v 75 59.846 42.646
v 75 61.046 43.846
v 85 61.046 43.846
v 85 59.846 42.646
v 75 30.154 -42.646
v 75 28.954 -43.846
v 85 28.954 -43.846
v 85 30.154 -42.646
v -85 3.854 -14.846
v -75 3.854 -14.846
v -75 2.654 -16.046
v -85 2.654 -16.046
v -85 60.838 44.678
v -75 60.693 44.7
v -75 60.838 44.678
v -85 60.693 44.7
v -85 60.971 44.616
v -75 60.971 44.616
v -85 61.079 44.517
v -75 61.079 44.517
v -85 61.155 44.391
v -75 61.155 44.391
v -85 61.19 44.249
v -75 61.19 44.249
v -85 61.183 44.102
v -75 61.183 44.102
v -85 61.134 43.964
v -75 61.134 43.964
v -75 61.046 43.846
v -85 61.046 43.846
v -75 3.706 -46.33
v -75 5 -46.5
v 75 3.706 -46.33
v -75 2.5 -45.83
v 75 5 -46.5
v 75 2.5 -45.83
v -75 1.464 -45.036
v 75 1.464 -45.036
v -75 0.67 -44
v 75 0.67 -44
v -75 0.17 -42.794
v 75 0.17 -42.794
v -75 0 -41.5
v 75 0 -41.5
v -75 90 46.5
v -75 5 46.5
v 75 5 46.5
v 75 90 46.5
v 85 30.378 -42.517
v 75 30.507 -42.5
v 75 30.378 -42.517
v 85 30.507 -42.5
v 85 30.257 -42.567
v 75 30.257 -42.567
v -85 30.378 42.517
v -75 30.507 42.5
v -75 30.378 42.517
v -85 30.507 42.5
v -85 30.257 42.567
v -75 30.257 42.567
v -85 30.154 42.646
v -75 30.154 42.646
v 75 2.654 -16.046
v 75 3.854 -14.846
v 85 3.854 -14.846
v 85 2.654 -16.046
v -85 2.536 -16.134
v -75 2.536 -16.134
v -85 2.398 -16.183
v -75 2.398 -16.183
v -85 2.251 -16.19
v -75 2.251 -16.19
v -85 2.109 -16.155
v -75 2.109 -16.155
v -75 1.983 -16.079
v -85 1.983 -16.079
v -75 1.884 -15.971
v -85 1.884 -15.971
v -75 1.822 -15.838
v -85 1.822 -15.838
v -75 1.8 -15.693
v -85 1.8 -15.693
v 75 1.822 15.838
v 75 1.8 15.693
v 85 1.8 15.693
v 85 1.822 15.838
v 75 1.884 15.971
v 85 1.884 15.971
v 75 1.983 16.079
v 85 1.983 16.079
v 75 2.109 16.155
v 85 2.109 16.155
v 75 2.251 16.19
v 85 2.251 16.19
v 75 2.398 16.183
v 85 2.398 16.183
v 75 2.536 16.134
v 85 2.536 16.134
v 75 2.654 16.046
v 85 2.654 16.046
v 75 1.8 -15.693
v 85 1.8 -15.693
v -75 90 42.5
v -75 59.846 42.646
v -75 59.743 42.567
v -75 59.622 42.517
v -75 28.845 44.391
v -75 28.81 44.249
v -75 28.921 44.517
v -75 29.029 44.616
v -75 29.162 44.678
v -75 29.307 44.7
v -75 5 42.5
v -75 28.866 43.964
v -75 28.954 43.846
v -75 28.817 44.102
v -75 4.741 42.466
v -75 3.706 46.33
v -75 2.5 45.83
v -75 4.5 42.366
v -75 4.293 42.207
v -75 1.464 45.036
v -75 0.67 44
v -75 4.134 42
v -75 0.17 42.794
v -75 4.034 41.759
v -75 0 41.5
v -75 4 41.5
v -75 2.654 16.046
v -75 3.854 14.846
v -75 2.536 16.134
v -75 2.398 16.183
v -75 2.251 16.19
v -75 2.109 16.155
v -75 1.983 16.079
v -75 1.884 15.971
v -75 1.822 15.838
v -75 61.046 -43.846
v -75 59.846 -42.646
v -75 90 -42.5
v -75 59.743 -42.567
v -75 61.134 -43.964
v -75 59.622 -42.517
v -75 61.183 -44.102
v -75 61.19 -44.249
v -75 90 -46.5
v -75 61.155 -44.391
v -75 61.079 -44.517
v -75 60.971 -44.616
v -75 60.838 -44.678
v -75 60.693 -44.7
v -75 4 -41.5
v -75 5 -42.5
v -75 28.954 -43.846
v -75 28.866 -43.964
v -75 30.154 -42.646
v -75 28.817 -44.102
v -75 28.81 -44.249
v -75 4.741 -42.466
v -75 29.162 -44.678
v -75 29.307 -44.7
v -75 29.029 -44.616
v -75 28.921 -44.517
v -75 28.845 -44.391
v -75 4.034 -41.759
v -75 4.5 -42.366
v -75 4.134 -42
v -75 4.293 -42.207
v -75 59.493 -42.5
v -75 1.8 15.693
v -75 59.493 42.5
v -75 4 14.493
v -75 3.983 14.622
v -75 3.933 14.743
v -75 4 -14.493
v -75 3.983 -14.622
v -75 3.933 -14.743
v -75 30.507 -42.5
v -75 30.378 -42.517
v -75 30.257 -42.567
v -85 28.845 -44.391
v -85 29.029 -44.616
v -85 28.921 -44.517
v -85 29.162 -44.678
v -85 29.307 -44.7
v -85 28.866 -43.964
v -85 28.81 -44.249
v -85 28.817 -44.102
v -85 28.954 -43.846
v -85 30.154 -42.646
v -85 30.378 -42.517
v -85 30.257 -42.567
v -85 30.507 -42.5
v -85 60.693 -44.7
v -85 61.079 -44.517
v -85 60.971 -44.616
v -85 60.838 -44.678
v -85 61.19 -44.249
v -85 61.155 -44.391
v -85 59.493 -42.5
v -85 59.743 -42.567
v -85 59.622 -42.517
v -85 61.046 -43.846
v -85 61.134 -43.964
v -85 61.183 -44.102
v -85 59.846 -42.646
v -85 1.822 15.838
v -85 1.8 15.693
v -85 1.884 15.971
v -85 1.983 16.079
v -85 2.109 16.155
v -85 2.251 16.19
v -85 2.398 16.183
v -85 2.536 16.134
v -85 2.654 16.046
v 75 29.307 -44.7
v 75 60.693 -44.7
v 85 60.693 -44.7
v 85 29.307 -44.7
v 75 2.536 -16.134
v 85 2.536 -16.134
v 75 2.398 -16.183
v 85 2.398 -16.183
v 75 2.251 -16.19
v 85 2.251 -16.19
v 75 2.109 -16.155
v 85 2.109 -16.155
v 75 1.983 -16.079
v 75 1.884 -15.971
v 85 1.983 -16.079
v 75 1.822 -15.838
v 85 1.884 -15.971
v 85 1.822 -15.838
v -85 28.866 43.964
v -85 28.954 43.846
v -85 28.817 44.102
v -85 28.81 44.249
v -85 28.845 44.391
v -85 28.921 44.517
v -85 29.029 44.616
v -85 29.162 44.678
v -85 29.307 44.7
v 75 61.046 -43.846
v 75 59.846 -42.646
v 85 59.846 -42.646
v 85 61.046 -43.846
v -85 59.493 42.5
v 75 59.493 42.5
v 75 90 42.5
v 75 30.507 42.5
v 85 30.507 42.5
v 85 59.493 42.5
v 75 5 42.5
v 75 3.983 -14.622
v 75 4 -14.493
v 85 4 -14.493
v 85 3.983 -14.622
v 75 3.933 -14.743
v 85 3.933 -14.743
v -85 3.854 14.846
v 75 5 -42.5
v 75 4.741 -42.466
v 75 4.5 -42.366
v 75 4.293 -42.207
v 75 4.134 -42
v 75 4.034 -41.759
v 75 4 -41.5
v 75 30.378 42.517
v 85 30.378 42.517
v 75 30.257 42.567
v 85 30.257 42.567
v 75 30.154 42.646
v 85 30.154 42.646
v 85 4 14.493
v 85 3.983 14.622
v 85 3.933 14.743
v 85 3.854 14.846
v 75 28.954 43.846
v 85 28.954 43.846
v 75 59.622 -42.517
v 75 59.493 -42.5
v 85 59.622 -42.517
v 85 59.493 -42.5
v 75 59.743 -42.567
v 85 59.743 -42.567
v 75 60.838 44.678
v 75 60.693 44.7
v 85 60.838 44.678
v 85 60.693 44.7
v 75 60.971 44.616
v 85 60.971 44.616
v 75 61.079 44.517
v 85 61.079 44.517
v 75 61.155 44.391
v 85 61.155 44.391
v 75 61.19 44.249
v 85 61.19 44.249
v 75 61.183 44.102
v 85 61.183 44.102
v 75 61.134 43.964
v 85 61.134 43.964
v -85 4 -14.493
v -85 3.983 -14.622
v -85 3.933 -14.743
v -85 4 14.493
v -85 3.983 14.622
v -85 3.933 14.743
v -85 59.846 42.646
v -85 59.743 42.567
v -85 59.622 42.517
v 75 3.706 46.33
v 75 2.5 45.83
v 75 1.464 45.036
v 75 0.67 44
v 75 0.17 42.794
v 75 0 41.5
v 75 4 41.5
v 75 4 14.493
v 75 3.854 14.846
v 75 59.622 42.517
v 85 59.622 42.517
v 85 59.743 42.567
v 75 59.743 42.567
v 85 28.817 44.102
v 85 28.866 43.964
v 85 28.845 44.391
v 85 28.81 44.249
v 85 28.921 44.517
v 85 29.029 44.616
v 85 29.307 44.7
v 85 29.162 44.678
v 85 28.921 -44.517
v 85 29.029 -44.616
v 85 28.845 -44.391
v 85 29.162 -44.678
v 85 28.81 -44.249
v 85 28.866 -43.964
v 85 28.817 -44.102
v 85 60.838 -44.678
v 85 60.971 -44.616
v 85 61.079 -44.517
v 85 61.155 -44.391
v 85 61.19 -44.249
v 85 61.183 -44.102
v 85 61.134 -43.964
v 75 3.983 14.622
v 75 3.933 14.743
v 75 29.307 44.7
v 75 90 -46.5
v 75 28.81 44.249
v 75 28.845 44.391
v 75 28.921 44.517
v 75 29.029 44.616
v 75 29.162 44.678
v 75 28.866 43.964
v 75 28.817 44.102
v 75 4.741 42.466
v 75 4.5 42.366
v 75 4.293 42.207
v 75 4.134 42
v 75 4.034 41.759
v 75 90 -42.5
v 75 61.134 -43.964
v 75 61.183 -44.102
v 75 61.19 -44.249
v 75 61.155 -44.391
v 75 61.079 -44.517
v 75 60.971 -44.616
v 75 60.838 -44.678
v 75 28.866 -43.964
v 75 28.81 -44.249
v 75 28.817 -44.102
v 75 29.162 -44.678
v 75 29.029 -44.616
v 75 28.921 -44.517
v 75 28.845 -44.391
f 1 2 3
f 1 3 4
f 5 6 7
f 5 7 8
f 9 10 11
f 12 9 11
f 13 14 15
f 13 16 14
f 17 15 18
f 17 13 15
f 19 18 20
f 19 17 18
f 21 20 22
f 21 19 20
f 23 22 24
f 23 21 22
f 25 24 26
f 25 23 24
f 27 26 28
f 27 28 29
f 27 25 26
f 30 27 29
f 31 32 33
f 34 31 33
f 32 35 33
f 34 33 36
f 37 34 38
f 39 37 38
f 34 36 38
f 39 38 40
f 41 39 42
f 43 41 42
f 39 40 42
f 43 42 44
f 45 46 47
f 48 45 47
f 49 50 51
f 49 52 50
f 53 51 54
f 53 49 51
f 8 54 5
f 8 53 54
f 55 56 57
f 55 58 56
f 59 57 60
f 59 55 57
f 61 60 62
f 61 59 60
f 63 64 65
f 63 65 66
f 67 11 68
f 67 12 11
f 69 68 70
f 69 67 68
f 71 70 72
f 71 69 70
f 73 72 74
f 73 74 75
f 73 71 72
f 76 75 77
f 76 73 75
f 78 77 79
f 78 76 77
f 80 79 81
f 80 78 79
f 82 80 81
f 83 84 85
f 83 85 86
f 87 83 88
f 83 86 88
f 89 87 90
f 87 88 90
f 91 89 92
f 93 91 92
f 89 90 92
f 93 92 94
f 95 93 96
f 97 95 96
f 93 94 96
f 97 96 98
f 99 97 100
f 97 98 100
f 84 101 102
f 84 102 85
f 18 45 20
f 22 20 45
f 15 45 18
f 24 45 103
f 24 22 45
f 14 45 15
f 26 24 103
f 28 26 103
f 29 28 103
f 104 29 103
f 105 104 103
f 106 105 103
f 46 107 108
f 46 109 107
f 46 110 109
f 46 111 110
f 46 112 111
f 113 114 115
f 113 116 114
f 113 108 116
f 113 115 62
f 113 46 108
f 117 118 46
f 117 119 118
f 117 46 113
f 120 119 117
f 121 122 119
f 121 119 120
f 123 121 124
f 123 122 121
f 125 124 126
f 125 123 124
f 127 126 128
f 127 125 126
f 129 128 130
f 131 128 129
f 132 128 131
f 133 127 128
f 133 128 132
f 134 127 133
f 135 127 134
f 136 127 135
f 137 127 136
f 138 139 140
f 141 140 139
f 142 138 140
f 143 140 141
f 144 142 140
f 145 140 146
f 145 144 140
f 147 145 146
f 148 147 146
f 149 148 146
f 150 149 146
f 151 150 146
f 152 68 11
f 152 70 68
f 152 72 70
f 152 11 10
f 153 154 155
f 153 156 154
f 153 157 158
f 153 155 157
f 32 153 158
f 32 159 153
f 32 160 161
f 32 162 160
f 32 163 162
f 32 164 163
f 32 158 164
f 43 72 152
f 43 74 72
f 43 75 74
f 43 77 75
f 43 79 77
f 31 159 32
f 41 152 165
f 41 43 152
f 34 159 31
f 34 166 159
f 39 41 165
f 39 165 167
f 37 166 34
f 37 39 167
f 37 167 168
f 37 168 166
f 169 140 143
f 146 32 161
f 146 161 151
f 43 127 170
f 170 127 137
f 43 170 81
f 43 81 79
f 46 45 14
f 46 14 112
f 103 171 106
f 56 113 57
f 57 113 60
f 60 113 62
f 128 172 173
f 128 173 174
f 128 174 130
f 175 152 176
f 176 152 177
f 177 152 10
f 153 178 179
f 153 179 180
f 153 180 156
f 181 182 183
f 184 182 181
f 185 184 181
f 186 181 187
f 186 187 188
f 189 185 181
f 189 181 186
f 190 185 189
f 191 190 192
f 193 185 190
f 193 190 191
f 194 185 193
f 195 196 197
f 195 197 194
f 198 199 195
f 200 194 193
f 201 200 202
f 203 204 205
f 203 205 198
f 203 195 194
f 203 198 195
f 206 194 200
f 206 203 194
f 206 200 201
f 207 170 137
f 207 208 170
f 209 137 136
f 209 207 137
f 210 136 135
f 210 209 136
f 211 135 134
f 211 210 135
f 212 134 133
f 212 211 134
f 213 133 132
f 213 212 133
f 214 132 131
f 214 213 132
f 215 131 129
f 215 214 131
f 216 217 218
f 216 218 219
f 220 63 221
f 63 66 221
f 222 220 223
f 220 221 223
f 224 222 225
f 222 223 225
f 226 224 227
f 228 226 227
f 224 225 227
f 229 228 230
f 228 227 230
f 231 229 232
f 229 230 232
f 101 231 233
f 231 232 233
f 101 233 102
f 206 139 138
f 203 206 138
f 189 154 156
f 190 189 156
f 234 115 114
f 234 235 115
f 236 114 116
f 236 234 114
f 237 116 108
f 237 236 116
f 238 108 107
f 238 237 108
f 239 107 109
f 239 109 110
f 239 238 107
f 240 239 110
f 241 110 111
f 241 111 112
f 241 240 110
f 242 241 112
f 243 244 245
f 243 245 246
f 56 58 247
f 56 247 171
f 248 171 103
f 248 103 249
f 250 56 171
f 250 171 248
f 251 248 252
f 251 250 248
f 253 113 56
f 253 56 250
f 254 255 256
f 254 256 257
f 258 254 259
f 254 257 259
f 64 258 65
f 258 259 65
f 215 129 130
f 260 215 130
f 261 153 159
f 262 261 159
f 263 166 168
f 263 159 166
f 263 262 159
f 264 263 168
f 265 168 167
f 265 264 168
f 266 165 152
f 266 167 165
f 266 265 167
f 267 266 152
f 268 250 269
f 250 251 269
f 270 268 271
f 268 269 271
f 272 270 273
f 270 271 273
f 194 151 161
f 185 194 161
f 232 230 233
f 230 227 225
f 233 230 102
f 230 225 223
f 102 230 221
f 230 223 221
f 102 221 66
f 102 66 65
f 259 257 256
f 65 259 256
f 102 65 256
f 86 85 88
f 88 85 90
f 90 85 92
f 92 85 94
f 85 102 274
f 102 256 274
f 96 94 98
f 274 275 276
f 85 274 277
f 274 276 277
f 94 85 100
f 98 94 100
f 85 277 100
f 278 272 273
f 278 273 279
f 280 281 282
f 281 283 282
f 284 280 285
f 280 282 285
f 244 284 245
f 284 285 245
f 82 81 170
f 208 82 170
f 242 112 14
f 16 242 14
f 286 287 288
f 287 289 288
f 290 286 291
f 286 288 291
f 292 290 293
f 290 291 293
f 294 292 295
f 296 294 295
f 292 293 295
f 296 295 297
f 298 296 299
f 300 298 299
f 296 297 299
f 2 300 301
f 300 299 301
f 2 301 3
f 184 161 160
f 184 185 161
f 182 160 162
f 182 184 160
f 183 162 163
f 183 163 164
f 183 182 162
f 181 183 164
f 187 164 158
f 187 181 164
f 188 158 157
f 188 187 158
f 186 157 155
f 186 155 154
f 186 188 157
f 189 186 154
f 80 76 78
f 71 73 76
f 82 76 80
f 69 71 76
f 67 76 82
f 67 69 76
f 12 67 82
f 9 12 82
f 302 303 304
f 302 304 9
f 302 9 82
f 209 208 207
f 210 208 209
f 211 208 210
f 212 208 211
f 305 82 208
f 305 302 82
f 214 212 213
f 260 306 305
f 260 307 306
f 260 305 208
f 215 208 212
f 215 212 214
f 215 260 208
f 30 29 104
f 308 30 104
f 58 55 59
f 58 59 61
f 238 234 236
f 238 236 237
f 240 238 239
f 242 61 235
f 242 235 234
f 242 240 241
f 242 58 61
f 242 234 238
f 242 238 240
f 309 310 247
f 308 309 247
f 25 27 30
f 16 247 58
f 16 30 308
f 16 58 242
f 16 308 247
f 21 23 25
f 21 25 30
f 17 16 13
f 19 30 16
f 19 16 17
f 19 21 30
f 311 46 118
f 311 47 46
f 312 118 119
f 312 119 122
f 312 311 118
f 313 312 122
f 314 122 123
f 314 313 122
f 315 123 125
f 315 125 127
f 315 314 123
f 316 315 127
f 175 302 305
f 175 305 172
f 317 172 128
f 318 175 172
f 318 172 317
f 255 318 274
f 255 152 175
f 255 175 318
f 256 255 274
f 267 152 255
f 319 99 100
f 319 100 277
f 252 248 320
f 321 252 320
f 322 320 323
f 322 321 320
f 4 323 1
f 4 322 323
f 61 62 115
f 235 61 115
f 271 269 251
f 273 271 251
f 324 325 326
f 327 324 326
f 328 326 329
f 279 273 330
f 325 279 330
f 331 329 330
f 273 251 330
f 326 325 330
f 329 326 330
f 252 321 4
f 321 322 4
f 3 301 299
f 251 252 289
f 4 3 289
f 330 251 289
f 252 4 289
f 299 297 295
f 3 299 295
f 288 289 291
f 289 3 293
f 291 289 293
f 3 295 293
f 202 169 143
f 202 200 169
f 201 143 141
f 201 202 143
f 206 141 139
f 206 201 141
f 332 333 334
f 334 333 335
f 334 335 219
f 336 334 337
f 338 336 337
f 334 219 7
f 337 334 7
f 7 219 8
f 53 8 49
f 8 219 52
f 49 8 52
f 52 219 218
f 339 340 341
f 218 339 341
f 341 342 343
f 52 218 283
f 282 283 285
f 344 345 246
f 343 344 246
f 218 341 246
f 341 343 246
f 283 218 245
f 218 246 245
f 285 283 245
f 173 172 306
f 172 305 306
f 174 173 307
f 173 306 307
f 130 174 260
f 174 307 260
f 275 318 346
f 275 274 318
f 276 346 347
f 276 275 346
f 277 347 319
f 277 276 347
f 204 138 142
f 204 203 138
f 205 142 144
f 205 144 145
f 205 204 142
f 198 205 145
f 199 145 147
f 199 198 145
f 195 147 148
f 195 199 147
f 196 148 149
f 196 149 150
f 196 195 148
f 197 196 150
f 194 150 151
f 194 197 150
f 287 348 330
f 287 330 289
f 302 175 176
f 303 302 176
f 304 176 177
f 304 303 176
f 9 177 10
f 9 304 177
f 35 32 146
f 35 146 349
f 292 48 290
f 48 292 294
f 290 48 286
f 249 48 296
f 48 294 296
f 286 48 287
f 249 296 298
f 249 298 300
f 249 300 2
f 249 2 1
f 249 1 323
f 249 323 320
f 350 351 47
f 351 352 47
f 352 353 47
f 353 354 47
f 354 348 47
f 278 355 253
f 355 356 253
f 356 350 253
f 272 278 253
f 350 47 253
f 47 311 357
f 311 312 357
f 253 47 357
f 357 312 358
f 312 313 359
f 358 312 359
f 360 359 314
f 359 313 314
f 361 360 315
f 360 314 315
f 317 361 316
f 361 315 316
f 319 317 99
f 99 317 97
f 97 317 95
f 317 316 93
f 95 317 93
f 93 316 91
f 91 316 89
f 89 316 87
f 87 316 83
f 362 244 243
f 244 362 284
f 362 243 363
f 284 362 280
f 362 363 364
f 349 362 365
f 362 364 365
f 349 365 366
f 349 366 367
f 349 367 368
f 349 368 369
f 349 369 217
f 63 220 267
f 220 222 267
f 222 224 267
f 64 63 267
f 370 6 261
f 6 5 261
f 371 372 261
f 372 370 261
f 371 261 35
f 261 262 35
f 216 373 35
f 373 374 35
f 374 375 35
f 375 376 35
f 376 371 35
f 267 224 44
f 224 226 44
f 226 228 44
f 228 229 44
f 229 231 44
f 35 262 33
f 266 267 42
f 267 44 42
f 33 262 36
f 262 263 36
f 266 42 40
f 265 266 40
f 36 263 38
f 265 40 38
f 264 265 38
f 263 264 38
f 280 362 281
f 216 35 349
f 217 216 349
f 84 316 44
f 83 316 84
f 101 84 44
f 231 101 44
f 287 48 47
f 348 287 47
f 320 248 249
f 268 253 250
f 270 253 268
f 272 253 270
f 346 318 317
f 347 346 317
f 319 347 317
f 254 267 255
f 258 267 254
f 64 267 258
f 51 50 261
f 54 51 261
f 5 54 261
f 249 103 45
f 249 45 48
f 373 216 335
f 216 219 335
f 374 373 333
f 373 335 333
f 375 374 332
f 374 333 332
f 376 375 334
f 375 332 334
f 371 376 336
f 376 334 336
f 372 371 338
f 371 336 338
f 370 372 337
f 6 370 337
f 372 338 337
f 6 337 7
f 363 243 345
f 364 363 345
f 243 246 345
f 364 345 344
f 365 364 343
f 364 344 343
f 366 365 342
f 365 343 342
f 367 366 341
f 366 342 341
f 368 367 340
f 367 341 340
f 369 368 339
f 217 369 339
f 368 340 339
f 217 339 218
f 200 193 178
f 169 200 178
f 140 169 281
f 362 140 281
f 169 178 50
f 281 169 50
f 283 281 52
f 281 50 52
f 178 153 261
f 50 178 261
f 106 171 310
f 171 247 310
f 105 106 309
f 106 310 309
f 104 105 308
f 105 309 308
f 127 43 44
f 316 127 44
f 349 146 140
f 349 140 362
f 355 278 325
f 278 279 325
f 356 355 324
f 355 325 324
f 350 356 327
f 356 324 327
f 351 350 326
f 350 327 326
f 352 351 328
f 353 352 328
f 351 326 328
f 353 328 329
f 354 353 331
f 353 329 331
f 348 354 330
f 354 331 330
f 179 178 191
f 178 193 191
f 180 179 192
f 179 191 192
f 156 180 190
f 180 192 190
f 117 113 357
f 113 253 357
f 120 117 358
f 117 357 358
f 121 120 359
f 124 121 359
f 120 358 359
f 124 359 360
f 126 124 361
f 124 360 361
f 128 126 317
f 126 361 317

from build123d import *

# Parameters (mm, degrees)
SKETCH_1_W             = 150
SKETCH_1_H             = 93
EXTRUDE_1_DEPTH        = 90
FILLET_1_R             = 5
SHELL_1_T              = -4
EXTRUDE_3_DEPTH        = 10
FILLET_2_R             = 0.5
FILLET_2_OF_MIRROR_1_R = 0.5


with BuildPart() as part:
    # 草圖1 → 填料-伸長1 (new body)
    with BuildSketch(Plane(origin=(0, 0, 0), x_dir=(1, 0, 0), z_dir=(0, 1, 0))):
        Rectangle(SKETCH_1_W, SKETCH_1_H)
    extrude(amount=EXTRUDE_1_DEPTH)

    # 圓角1
    fillet_1_edges = [part.edges().sort_by_distance(p)[0] for p in [
        (0, 0, 46.5),
        (0, 0, -46.5),
    ]]
    fillet(fillet_1_edges, radius=FILLET_1_R)

    # 薄殼1
    shell_1_openings = [part.faces().sort_by_distance(p)[0] for p in [
        (0, 90, 0),
        (-75, 45.056329123, 0),
        (75, 45.056329123, 0),
    ]]
    offset(amount=SHELL_1_T, openings=shell_1_openings, kind=Kind.INTERSECTION)

    # 草圖2 → 填料-伸長3 (add)
    with BuildSketch(Plane(origin=(75, 0, 0), x_dir=(0, 0, -1), z_dir=(1, 0, 0))):
        Polygon((42.5, 59.7), (44.7, 61.9), (44.7, 28.1), (42.5, 30.3), align=None)
        Polygon((14.7, 4), (16.9, 1.8), (-16.9, 1.8), (-14.7, 4), align=None)
        Polygon((-42.5, 59.7), (-42.5, 30.3), (-44.7, 28.1), (-44.7, 61.9), align=None)
    extrude_3 = extrude(amount=EXTRUDE_3_DEPTH)

    # 圓角2
    fillet_2_edges = [part.edges().sort_by_distance(p)[0] for p in [
        (80, 59.7, -42.5),
        (80, 30.3, -42.5),
        (80, 28.1, -44.7),
        (80, 61.9, -44.7),
        (80, 4, -14.7),
        (80, 4, 14.7),
        (80, 1.8, 16.9),
        (80, 1.8, -16.9),
        (80, 61.9, 44.7),
        (80, 28.1, 44.7),
        (80, 30.3, 42.5),
        (80, 59.7, 42.5),
    ]]
    fillet(fillet_2_edges, radius=FILLET_2_R)

    # 鏡射1: 填料-伸長3 across plane
    add(extrude_3.mirror(Plane(origin=(0, 0, 0), x_dir=(0, 0, 1), z_dir=(1, 0, 0))))

    # 圓角2 of 鏡射1
    fillet_2_of_mirror_1_edges = [part.edges().sort_by_distance(p)[0] for p in [
        (-80, 59.7, -42.5),
        (-80, 30.3, -42.5),
        (-80, 28.1, -44.7),
        (-80, 61.9, -44.7),
        (-80, 4, -14.7),
        (-80, 4, 14.7),
        (-80, 1.8, 16.9),
        (-80, 1.8, -16.9),
        (-80, 61.9, 44.7),
        (-80, 28.1, 44.7),
        (-80, 30.3, 42.5),
        (-80, 59.7, 42.5),
    ]]
    fillet(fillet_2_of_mirror_1_edges, radius=FILLET_2_OF_MIRROR_1_R)


solid = part.part
